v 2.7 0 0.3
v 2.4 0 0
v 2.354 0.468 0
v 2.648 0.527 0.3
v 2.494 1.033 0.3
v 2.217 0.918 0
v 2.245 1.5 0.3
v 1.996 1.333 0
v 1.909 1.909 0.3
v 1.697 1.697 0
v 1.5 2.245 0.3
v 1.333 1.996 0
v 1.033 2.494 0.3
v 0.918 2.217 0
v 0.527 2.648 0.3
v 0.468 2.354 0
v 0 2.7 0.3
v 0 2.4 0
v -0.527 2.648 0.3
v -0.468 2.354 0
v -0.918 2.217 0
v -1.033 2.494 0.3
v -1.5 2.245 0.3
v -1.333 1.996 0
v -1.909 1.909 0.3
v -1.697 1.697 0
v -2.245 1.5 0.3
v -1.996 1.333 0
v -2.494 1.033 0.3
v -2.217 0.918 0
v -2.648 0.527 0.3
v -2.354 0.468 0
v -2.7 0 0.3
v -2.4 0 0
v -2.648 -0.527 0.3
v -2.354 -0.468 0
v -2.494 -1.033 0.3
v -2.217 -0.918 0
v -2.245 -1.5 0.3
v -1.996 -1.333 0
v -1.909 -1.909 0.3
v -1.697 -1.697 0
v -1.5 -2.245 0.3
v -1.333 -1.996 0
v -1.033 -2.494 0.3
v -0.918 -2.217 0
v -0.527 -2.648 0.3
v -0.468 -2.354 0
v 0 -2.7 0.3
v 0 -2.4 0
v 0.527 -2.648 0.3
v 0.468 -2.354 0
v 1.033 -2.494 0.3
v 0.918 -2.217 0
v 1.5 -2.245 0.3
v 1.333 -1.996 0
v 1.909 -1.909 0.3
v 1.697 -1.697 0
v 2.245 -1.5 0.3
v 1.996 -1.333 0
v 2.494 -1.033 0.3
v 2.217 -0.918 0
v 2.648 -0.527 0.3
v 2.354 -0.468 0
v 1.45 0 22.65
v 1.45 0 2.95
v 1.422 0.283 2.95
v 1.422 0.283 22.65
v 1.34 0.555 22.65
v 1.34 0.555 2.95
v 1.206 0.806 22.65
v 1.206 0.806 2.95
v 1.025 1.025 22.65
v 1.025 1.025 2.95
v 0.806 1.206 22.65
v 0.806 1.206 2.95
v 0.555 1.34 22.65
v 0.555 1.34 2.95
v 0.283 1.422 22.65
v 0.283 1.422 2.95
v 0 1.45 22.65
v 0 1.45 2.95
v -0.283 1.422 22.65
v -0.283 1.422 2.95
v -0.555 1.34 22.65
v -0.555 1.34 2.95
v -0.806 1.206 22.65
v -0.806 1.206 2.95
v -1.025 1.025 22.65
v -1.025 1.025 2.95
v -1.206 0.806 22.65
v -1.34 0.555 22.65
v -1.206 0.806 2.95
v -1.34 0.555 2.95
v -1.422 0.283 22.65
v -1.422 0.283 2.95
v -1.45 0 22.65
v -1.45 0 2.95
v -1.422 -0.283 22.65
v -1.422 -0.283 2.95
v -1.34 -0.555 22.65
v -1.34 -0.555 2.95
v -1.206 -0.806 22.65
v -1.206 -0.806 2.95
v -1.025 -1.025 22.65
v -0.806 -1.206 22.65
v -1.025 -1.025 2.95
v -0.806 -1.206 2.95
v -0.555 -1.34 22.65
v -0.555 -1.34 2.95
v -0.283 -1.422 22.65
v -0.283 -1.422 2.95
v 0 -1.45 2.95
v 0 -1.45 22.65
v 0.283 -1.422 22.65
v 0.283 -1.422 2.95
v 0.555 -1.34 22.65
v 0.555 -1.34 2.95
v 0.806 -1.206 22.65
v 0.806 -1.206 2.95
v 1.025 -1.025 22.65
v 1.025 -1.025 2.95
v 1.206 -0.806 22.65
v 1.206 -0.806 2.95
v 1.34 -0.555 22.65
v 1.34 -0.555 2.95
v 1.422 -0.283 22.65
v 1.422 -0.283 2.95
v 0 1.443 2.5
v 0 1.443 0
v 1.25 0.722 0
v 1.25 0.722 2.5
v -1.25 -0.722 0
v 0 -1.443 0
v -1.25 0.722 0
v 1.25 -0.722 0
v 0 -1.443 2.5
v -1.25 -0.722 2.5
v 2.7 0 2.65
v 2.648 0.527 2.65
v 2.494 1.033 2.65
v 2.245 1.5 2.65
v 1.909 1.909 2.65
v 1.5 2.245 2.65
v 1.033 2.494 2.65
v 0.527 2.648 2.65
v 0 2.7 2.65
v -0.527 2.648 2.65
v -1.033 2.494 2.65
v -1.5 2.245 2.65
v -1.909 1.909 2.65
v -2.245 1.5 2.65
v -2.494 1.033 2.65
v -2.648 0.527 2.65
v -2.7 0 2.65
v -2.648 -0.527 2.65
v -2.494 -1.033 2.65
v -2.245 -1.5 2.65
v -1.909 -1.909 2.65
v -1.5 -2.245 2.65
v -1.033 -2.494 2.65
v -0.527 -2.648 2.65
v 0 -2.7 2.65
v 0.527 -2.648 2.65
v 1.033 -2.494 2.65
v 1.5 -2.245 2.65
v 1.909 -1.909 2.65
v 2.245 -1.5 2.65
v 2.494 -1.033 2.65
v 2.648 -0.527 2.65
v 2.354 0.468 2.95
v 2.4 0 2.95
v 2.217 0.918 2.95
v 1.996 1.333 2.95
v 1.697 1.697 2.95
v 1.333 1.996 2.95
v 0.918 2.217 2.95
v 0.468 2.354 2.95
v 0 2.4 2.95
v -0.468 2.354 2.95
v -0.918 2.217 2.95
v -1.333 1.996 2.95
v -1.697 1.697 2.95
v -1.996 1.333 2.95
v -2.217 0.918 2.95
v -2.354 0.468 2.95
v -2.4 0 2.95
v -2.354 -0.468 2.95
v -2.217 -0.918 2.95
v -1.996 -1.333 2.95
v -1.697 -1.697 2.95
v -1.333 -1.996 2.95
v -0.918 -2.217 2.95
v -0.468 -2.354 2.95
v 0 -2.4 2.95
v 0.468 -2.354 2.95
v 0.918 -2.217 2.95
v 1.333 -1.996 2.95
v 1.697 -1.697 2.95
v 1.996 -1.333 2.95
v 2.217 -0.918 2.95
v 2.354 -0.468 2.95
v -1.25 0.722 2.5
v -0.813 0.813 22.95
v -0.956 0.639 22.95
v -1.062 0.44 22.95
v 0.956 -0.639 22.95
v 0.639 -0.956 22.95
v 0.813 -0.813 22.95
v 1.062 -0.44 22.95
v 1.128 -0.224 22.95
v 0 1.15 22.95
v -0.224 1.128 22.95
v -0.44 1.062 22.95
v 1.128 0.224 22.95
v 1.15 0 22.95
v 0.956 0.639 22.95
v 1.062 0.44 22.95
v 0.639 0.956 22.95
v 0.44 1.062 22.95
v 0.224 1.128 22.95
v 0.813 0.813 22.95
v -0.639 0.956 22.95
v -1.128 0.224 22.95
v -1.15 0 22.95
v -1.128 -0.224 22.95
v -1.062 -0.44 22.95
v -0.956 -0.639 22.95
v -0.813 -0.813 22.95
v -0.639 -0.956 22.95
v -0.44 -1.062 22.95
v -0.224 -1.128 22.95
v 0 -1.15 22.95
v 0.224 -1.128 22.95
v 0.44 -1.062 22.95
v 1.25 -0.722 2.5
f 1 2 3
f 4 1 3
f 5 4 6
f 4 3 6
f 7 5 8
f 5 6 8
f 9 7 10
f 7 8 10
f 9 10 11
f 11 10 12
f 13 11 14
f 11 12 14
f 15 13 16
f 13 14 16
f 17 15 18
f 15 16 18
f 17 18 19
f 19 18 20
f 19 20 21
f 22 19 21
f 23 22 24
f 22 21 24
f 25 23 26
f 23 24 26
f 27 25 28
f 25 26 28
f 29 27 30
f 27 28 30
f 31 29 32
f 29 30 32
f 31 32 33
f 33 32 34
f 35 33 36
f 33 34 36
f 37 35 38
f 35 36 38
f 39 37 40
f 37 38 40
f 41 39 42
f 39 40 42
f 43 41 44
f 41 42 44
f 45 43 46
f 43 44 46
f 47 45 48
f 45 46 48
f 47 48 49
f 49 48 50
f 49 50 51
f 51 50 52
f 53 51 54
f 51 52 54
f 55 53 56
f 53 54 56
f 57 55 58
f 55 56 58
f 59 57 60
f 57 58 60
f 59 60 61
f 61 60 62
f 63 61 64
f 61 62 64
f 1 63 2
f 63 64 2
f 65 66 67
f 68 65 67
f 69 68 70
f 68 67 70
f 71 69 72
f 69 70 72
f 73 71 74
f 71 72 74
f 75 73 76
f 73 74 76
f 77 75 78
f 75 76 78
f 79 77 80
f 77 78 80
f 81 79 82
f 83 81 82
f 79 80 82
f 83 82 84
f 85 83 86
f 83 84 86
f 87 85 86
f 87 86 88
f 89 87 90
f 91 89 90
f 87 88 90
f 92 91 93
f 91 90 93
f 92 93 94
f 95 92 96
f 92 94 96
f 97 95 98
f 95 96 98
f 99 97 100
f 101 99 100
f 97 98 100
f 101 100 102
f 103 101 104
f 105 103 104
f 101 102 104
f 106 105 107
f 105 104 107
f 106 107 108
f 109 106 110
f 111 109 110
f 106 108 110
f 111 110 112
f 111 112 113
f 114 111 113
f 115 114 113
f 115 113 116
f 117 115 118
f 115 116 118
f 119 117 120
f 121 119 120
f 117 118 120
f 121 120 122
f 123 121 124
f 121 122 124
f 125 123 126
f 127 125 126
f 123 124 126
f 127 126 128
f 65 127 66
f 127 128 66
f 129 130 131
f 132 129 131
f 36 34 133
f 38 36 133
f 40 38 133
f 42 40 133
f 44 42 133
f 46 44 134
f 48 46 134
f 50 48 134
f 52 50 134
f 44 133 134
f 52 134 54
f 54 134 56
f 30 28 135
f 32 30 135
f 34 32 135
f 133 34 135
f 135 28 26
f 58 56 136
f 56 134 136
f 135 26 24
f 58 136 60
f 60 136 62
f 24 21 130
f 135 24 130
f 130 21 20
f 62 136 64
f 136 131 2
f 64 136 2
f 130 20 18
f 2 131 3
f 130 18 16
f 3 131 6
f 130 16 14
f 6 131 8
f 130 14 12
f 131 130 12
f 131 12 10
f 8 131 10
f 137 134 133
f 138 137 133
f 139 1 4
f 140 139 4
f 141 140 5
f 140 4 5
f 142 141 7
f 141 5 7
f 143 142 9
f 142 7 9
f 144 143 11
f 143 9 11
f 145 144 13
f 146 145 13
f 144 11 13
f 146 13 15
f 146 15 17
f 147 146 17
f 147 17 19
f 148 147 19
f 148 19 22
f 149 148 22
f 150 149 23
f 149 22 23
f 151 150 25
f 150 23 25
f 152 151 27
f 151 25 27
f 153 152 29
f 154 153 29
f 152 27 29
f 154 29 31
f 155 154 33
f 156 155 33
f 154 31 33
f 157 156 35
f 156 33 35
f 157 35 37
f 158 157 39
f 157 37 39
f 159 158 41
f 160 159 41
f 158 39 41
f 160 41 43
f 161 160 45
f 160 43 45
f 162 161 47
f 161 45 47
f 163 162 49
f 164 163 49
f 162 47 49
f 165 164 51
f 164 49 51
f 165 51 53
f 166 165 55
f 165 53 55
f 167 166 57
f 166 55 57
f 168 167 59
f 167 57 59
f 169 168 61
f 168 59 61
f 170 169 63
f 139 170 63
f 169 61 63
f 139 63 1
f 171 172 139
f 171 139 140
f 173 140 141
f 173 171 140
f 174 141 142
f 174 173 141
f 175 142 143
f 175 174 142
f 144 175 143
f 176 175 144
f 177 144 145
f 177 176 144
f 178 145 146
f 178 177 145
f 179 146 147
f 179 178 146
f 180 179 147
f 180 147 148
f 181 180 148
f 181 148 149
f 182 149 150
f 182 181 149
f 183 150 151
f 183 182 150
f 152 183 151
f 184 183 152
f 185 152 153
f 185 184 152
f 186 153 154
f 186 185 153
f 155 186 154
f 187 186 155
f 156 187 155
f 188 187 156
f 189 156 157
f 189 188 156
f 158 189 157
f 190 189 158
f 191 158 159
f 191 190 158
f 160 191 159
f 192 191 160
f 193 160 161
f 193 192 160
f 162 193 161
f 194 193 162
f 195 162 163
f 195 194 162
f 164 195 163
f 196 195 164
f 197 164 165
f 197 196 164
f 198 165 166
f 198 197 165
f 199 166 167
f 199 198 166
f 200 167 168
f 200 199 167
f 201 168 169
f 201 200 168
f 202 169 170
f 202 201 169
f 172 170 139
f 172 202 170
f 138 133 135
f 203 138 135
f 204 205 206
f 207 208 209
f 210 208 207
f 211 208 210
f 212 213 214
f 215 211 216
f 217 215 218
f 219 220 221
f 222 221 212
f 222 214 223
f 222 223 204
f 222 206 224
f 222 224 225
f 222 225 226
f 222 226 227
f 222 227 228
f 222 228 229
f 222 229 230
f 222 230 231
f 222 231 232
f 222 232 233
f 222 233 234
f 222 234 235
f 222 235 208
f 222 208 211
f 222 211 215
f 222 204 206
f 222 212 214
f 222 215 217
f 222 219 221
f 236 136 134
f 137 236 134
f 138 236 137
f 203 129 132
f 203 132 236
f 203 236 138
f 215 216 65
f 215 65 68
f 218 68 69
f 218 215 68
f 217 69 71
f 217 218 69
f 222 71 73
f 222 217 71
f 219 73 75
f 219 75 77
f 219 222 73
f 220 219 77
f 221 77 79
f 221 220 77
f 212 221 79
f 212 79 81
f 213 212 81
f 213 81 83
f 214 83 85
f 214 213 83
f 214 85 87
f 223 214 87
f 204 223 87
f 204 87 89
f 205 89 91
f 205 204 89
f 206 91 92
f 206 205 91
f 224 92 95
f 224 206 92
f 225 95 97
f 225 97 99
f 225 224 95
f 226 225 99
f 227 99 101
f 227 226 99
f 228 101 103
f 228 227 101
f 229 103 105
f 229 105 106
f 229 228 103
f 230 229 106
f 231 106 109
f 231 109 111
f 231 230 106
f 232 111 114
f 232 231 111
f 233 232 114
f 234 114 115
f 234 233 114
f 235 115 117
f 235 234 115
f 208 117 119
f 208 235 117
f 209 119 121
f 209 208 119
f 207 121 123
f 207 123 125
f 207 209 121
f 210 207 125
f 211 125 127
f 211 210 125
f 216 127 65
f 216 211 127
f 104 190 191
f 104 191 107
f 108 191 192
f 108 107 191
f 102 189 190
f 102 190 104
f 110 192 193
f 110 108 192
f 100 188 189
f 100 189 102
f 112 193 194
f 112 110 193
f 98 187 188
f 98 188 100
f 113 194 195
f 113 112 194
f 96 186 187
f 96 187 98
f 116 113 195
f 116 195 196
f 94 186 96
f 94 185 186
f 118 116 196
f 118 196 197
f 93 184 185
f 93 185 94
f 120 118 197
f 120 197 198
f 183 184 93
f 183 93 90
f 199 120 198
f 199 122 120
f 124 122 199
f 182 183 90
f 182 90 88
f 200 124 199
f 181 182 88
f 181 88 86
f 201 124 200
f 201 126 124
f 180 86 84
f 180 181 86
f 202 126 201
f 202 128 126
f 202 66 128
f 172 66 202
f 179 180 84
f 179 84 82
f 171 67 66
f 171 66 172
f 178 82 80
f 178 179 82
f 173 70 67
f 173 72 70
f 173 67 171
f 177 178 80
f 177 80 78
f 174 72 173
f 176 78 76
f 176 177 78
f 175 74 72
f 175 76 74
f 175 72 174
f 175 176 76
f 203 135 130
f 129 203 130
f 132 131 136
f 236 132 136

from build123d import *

# Parameters (mm, degrees)
SKIZZE1_R                       = 2.7
AUFSATZ_LINEAR_AUSTRAGEN1_DEPTH = 2.95
SKIZZE2_R                       = 1.45
AUFSATZ_LINEAR_AUSTRAGEN2_DEPTH = 20
FASE1_SIZE                      = 0.3
SCHNITT_LINEAR_AUSTRAGEN1_DEPTH = 2.5


with BuildPart() as part:
    # Skizze1 → Aufsatz-Linear austragen1 (new body)
    with BuildSketch(Plane.XY):
        Circle(SKIZZE1_R)
    extrude(amount=AUFSATZ_LINEAR_AUSTRAGEN1_DEPTH)

    # Skizze2 → Aufsatz-Linear austragen2 (add)
    with BuildSketch(Plane.XY.offset(2.95)):
        Circle(SKIZZE2_R)
    extrude(amount=AUFSATZ_LINEAR_AUSTRAGEN2_DEPTH)

    # Fase1
    fase1_edges = [part.edges().sort_by_distance(p)[0] for p in [
        (-2.7, 0, 0),
        (-2.7, 0, 2.95),
        (-1.45, 0, 22.95),
    ]]
    chamfer(fase1_edges, length=FASE1_SIZE)

    # Skizze3 → Schnitt-Linear austragen1 (cut)
    with BuildSketch(Plane(origin=(0, 0, 0), x_dir=(-1, 0, 0), z_dir=(0, 0, -1))):
        Polygon((1.25, 0.721687836), (0, 1.443375673), (-1.25, 0.721687836), (-1.25, -0.721687836), (0, -1.443375673), (1.25, -0.721687836), align=None)
    extrude(amount=-SCHNITT_LINEAR_AUSTRAGEN1_DEPTH, mode=Mode.SUBTRACT)


solid = part.part
